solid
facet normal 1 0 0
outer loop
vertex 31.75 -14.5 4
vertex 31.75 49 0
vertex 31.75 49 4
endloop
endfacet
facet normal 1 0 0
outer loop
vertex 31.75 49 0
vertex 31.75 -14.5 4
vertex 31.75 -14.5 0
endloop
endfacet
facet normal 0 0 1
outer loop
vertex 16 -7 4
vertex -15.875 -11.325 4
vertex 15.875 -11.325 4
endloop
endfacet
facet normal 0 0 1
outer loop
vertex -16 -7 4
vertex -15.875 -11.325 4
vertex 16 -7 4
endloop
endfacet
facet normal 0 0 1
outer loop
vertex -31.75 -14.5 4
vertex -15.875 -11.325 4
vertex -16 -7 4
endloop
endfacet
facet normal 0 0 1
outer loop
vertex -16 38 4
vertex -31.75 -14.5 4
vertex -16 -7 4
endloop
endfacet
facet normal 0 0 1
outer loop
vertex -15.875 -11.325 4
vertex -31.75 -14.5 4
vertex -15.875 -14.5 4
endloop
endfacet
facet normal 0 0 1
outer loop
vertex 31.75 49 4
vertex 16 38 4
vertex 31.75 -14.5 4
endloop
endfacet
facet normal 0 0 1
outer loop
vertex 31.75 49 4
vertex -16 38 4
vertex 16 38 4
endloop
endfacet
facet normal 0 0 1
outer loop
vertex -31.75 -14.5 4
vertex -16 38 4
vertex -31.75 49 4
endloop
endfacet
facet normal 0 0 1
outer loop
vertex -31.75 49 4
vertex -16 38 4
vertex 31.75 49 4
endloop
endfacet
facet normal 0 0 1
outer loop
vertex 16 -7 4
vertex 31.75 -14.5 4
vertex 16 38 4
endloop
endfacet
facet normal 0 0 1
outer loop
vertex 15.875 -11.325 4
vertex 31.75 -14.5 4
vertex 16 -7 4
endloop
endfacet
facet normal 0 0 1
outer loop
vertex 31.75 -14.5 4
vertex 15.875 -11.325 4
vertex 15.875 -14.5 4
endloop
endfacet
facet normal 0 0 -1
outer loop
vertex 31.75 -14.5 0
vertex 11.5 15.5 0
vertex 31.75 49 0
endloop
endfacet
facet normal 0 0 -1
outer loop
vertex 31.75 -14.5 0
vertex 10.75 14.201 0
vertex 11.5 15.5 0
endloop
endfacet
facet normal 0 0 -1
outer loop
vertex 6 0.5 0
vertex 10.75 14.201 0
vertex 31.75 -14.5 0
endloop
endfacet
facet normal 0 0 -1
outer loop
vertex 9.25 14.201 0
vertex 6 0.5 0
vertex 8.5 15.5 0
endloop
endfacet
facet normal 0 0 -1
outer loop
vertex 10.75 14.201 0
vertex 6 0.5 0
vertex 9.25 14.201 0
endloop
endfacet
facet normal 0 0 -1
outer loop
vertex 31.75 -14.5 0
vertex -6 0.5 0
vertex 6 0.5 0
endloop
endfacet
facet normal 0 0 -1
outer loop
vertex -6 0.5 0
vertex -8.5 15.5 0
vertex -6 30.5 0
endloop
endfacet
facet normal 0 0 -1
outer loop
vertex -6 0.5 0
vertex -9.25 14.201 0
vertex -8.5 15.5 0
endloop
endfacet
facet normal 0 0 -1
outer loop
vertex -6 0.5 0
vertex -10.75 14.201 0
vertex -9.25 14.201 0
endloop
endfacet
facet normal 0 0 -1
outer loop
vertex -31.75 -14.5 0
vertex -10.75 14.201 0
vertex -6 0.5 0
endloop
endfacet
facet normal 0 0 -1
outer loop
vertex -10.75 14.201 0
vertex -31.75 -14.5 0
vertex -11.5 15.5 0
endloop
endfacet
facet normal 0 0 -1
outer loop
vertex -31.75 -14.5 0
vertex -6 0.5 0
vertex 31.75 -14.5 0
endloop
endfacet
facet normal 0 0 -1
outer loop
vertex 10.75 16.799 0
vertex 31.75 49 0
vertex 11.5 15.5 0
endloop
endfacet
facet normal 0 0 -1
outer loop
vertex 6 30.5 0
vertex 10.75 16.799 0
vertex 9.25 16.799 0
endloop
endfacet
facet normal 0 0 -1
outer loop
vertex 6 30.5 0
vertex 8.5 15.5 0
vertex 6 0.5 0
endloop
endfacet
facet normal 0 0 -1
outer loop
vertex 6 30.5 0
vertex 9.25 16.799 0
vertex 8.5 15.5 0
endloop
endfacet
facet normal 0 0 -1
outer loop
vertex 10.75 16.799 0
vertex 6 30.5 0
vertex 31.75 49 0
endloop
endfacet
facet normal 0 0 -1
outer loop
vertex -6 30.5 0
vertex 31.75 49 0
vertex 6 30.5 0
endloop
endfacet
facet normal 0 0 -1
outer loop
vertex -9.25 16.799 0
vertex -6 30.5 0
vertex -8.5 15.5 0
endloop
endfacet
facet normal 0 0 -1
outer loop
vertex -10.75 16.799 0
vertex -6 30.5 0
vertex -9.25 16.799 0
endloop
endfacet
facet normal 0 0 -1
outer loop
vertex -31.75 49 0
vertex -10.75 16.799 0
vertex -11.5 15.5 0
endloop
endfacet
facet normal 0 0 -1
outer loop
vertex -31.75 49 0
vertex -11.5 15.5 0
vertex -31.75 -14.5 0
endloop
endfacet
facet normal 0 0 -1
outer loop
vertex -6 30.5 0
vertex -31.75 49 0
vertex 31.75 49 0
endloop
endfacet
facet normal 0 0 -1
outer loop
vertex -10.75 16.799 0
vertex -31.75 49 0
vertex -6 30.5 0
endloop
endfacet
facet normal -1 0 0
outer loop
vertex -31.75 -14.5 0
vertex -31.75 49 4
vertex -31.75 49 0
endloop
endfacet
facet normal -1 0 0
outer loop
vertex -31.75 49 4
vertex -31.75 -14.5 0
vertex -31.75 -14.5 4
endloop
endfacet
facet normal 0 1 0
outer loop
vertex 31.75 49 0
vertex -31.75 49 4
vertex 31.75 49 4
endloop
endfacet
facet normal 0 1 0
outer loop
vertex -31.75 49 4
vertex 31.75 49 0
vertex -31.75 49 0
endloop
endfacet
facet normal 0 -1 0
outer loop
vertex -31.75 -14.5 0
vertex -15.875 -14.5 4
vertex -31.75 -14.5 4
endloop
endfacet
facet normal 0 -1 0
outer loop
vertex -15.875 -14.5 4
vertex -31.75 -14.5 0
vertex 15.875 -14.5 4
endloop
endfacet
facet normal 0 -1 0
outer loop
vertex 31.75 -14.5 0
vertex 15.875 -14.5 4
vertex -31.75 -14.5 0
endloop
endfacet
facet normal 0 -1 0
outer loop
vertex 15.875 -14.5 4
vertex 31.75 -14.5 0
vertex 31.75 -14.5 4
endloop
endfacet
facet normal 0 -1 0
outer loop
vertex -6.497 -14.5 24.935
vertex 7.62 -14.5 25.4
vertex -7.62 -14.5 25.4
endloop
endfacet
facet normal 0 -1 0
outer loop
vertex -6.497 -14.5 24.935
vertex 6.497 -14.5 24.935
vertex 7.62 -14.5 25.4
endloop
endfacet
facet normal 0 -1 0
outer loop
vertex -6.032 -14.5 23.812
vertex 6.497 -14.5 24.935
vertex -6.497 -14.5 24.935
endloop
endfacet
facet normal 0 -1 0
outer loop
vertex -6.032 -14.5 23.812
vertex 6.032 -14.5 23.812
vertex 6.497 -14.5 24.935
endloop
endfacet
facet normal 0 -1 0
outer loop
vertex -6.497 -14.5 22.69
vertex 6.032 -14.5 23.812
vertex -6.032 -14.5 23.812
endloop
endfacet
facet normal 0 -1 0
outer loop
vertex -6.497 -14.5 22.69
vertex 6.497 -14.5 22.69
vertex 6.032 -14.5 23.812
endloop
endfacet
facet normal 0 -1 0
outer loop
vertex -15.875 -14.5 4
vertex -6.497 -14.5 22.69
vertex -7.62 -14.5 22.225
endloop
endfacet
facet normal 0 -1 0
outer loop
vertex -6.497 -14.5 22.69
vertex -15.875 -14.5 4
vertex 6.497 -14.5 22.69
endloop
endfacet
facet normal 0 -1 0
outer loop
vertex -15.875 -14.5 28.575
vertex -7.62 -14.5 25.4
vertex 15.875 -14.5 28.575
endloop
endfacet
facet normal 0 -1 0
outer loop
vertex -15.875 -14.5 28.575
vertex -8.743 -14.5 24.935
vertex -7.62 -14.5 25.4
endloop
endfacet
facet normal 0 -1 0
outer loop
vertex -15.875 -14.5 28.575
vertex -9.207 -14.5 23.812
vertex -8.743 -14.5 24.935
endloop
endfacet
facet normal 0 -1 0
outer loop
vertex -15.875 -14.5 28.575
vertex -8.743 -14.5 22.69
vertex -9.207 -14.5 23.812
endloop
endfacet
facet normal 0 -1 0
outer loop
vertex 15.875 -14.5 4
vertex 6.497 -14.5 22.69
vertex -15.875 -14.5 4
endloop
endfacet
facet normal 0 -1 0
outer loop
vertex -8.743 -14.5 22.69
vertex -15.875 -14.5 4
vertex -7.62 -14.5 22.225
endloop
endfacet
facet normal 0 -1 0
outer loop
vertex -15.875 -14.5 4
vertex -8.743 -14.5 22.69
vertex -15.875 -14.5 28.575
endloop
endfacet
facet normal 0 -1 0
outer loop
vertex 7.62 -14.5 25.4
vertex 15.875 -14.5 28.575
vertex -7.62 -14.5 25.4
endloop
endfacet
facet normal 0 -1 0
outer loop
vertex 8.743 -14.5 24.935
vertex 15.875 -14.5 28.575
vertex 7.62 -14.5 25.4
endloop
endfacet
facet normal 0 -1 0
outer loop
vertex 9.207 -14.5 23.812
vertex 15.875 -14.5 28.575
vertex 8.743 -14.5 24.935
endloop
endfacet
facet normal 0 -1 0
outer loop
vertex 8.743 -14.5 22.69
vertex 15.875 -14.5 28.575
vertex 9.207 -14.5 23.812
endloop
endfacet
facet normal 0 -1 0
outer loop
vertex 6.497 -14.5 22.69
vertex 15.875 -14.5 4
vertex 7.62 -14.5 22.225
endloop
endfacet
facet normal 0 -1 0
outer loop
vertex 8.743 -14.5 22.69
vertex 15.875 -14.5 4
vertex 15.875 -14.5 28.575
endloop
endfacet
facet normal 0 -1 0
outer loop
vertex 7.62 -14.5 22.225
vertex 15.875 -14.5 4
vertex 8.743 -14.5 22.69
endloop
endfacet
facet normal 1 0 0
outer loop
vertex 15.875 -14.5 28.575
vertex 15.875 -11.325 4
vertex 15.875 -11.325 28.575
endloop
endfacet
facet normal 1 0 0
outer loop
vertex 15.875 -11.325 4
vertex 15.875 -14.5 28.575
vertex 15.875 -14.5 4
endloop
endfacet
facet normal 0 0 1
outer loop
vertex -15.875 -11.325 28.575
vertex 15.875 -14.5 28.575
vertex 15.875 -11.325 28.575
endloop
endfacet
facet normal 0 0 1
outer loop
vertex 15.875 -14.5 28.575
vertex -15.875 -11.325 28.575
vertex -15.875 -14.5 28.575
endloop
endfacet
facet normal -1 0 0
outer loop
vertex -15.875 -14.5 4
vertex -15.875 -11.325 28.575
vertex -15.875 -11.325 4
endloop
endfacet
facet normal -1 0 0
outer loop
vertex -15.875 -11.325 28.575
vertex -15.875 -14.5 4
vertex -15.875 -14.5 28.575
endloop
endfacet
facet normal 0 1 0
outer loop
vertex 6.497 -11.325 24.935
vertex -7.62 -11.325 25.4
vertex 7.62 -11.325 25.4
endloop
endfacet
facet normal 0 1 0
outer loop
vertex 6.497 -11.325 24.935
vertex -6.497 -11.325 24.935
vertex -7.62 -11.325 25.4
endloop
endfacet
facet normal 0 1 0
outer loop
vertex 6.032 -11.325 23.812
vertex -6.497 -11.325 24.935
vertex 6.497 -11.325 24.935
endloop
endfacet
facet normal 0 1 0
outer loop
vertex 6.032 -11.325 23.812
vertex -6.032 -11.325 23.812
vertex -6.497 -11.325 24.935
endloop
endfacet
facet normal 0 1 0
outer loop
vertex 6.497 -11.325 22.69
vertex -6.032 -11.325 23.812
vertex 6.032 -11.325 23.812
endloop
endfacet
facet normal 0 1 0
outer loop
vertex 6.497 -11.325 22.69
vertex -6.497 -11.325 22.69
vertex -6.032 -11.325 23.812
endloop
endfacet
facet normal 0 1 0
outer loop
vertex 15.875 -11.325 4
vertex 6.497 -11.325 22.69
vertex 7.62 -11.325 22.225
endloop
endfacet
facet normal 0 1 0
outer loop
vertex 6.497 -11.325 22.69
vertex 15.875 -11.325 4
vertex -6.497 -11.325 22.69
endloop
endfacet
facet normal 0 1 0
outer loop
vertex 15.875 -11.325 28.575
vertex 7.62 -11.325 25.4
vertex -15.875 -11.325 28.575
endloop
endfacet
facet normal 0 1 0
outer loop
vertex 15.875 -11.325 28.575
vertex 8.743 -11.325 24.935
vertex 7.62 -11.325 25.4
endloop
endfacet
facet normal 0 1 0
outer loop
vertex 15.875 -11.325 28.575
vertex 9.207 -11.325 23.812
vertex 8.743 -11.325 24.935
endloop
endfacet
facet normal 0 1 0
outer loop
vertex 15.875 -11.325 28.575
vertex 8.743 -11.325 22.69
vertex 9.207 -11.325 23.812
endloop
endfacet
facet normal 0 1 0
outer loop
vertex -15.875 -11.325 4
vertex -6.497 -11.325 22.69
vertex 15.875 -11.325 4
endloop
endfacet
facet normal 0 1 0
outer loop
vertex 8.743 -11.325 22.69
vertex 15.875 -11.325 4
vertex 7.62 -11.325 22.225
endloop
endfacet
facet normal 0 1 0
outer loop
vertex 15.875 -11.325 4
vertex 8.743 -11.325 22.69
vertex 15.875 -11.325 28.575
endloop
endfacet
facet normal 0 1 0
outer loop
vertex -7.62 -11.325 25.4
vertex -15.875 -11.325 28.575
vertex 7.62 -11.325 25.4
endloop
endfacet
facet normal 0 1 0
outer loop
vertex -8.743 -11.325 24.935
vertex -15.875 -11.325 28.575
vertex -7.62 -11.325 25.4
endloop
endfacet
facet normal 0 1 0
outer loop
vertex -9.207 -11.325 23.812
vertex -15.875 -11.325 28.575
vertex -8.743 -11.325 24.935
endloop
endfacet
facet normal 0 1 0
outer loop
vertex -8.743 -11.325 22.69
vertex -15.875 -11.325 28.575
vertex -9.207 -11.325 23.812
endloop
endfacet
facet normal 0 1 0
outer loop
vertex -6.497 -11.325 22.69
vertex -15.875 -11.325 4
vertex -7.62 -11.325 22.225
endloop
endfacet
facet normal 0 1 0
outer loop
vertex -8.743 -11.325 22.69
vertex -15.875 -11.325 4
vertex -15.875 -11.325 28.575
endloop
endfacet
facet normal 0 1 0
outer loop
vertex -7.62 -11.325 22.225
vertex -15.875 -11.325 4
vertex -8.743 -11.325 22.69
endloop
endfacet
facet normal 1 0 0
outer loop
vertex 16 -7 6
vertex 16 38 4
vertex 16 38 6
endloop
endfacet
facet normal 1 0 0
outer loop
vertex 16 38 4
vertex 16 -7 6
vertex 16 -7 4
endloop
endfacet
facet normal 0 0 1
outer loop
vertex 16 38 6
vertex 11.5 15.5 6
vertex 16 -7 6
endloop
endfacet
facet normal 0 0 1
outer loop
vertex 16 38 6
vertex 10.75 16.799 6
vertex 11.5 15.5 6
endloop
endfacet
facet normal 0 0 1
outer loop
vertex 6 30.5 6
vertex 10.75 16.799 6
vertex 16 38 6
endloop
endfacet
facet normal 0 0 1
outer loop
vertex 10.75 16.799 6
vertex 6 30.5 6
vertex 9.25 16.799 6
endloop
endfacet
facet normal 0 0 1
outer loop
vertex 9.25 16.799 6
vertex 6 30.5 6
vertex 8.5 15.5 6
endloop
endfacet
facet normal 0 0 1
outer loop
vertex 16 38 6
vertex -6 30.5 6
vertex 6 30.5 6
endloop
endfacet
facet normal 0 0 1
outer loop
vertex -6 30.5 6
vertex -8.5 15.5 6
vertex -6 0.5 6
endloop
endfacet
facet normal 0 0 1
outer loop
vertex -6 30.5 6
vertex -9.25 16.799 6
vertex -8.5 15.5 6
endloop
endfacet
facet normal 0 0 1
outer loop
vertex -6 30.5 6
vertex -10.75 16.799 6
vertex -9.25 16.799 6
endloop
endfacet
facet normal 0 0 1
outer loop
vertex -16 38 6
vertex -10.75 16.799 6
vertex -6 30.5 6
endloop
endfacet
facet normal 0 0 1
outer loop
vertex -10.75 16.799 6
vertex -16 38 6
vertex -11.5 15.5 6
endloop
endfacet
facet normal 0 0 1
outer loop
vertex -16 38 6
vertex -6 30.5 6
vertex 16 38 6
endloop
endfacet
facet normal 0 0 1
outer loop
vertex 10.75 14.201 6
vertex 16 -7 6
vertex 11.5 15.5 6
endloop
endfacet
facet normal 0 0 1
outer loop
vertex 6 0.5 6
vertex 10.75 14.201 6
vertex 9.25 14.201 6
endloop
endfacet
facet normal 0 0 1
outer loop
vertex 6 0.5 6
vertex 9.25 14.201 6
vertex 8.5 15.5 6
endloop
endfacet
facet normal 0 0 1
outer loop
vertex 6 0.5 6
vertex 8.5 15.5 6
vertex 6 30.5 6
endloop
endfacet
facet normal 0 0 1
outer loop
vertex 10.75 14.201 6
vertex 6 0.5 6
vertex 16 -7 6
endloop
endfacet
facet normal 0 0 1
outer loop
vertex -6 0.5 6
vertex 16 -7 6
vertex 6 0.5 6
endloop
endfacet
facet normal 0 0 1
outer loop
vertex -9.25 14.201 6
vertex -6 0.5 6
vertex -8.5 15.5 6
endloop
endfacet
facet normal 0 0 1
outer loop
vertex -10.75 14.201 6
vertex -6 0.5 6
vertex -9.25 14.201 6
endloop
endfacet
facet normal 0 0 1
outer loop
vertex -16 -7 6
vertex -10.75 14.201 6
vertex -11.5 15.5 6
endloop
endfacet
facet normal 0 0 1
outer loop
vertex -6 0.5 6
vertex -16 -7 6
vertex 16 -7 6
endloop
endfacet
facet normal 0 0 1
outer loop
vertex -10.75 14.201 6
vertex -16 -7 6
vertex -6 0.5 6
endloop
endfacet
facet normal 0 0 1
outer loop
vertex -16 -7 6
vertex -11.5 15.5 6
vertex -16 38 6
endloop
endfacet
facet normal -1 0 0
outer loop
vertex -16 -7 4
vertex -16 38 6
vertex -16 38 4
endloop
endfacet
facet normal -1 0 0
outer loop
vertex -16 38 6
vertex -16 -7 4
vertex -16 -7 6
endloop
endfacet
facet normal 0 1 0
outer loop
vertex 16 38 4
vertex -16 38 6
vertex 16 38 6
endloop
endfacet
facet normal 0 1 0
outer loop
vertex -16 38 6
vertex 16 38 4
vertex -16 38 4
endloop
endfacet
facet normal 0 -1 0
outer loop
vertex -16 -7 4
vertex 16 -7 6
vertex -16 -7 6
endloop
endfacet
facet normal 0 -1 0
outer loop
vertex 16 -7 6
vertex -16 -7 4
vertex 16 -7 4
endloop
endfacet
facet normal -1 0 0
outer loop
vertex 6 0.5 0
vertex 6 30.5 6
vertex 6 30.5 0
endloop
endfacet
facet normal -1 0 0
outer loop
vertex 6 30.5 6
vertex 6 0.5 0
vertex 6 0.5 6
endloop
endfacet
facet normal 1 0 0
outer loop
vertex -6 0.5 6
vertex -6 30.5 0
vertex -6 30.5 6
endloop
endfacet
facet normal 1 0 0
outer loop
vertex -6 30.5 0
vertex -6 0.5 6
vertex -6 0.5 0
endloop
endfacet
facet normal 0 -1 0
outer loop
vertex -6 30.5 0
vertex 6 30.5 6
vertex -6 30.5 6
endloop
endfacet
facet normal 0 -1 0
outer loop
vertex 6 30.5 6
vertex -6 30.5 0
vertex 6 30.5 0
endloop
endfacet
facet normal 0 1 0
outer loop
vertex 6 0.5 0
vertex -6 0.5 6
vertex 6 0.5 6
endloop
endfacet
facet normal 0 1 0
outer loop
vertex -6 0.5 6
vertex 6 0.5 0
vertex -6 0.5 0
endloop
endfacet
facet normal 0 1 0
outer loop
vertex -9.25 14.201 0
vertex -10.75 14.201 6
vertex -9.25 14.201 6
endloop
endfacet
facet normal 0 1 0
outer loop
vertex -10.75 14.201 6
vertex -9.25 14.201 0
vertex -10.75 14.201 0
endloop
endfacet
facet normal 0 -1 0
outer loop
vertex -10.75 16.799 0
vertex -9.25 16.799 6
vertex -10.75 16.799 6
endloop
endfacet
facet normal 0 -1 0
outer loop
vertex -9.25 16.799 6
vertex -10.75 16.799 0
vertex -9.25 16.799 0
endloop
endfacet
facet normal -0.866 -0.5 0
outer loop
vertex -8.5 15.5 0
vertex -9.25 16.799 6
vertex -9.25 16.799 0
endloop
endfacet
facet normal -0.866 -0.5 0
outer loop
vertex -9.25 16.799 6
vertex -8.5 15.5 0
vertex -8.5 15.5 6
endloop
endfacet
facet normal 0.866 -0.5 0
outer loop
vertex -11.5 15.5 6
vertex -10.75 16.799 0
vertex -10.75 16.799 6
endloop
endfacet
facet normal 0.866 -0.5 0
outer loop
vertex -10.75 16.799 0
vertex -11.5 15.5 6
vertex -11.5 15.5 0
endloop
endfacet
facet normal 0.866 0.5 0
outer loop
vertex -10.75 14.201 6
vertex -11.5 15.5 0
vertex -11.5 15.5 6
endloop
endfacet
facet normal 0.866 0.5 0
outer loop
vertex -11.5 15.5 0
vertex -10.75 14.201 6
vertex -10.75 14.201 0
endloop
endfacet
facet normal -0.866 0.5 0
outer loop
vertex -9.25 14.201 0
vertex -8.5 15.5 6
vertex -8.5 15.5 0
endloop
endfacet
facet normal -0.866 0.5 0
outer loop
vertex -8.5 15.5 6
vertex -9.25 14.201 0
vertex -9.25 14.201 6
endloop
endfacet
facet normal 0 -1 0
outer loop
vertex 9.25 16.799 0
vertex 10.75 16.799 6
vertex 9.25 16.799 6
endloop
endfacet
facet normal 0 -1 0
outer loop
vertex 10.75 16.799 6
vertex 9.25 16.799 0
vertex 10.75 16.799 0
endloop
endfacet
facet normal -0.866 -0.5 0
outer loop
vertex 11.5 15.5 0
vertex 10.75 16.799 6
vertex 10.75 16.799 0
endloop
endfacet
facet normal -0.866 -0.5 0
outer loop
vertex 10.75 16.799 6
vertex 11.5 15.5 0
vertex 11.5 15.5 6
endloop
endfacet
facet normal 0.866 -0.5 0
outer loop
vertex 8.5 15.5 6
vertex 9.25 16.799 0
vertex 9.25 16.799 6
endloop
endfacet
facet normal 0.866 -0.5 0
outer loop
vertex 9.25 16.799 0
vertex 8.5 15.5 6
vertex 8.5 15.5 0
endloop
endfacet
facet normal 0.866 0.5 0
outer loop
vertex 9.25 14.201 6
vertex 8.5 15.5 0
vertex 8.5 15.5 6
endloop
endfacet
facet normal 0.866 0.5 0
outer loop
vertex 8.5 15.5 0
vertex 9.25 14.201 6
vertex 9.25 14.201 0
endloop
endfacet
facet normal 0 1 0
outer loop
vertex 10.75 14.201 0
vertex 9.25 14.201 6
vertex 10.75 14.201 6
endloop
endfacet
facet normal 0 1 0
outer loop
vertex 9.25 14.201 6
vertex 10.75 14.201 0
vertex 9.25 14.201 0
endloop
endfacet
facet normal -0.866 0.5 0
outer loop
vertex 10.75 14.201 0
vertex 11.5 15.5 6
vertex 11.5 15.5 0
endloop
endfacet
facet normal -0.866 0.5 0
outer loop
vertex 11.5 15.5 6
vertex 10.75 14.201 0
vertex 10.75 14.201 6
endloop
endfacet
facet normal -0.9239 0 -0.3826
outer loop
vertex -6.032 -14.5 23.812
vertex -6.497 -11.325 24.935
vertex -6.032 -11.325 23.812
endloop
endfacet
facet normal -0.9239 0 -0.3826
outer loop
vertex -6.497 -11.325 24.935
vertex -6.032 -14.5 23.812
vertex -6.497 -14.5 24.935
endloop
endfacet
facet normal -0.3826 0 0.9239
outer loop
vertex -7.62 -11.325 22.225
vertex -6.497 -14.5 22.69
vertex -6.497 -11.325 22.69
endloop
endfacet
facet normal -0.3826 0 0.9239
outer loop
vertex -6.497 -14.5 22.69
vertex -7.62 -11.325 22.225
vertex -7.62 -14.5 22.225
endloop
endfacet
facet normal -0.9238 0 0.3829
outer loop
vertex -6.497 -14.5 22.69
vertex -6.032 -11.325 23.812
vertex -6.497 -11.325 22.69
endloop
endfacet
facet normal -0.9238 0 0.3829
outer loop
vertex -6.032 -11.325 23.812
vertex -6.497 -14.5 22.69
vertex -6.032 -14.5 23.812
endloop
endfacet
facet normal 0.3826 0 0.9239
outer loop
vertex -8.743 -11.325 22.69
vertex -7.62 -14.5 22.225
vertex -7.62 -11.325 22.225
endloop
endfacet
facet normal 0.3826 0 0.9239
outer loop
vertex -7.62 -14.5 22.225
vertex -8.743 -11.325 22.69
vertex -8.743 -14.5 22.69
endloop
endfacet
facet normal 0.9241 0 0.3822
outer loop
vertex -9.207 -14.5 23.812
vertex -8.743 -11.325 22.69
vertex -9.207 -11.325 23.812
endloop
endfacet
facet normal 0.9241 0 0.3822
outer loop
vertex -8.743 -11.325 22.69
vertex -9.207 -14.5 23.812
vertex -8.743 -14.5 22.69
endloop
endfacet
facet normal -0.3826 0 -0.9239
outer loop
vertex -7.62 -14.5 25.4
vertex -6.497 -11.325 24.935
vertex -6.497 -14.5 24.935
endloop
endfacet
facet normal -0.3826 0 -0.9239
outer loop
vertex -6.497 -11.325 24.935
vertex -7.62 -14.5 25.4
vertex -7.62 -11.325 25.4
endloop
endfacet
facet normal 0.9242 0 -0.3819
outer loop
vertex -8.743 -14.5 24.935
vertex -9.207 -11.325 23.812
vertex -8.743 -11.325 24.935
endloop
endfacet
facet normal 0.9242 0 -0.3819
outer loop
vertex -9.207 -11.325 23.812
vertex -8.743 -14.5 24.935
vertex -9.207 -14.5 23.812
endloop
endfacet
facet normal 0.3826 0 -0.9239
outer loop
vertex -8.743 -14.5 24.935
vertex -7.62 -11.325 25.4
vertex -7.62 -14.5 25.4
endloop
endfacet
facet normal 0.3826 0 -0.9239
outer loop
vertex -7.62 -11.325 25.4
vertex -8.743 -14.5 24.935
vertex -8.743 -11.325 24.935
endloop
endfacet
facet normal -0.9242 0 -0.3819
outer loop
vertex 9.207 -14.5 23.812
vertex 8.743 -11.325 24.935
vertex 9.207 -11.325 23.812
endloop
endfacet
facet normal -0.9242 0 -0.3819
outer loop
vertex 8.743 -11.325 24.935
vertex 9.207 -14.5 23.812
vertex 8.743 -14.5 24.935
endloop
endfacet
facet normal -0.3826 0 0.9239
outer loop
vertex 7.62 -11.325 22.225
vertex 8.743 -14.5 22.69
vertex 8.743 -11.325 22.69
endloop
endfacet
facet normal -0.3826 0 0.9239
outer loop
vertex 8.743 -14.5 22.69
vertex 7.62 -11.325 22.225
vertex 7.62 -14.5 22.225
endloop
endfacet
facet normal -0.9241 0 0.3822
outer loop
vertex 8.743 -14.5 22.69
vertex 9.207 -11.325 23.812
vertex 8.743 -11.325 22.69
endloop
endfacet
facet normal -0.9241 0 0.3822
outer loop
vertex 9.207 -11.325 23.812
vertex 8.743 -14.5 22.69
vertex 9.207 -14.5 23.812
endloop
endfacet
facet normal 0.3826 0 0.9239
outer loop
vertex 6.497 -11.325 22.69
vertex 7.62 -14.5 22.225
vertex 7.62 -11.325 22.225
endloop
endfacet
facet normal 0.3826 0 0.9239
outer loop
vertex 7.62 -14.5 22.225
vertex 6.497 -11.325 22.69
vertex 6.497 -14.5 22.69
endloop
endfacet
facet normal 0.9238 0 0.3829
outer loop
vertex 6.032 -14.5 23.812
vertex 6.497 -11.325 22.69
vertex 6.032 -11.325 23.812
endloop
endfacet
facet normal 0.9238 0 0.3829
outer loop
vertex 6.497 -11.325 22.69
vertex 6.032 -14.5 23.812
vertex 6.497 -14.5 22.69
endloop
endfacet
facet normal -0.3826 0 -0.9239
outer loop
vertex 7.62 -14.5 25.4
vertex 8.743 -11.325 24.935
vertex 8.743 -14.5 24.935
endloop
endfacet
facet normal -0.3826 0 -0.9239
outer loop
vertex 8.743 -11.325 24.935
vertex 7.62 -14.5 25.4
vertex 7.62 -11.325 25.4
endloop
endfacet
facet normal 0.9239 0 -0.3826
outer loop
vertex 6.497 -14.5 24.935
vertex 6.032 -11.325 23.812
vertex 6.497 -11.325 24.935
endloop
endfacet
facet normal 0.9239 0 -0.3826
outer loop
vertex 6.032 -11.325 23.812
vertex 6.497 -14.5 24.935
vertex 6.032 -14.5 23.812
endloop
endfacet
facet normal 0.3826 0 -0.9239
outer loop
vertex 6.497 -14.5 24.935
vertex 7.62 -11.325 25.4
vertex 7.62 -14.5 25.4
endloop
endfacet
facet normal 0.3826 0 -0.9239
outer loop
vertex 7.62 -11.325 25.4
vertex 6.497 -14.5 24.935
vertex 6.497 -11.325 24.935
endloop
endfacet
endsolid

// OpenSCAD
// file: utils.scad
//
// general utility functions for OpenSCAD
//
function inch(in) = 25.4*in;
// main file
// mount for 35mm slides and compatible optical components
// Copyright (C) 2016, Theodore C Yapo

use <utils.scad>;


ring_length = 10;
center_height = 14.5;
outer_d = 2*center_height / cos(30);
ring_thickness = 4;
inner_d = outer_d - 2*ring_thickness;
screw_spacing = inch(0.6);
base_width = inch(1.25);
base_thickness = inch(0.125);
base_length = inch(1.125);

face_width = inch(2.5);
face_height = inch(2.5);
nut_block_thickness = 6;
nut_block_width = 12;

// recesses for #4-40 hex nuts
nut_d = inch(0.25) / cos(30) + 0.5;
nut_h = 3;

set_screw_d = inch(0.125);
mounting_hole_spacing = 40;
mounting_hole_height = 15;
mounting_hole_d = 3;
mounting_slot_length = 3;

epsilon = 1;

slide_aperture_height = 30;
slide_aperture_width = 12;
platform_width = 10;
platform_height = 45;
platform_thickness = 2;


face_thickness = 4;

module LED_mount(){
  difference(){
    union(){
      // face
      translate([-face_width/2, -center_height, 0]){
        cube([face_width, face_height, face_thickness]);
      }

      // base
      translate([-base_width/2, -center_height, 0]){
        cube([base_width, base_thickness, base_length]);
      }

      // blade platforms
      translate([-slide_aperture_width/2 - platform_width,
                 +slide_aperture_height/2-center_height -
                 (platform_height-slide_aperture_height)/2,
                 face_thickness]){
        cube([platform_width*2+slide_aperture_width,
              platform_height, platform_thickness]);
      }
    }

    // slide aperture
    translate([-slide_aperture_width/2,
               +slide_aperture_height/2-center_height,
               -epsilon]){
      cube([slide_aperture_width,
            slide_aperture_height,
            face_thickness + platform_thickness + 2*epsilon]);
    }

    // razor mounting holes
    translate([-10,
               +slide_aperture_height/2-center_height -
               (platform_height-slide_aperture_height)/2
               +platform_height/2,
               -epsilon]){
      cylinder($fn=6, d=3, h = face_thickness+platform_thickness+2*epsilon);
    }
    translate([+10,
               +slide_aperture_height/2-center_height -
               (platform_height-slide_aperture_height)/2
               +platform_height/2,
               -epsilon]){
      cylinder($fn=6, d=3, h = face_thickness+platform_thickness+2*epsilon);
    }

    // mounting screw holes
    translate([-inch(0.6)/2,
               -center_height-epsilon,
               (base_length - inch(0.75))/2]){
      rotate([-90, 0, 0]){
        *cylinder($fn=8, d = inch(0.125), h = inch(0.25));
      }
    }
    translate([+inch(0.6)/2,
               -center_height-epsilon,
               (base_length - inch(0.75))/2]){
      rotate([-90, 0, 0]){
        *cylinder($fn=8, d = inch(0.125), h = inch(0.25));
      }
    }
    translate([-inch(0.6)/2,
               -center_height - epsilon,
               base_length - (base_length - inch(0.75))/2]){
      rotate([-90, 0, 0]){
        cylinder($fn=8, d = inch(0.125), h = inch(0.25));
      }
    }
    translate([+inch(0.6)/2,
               -center_height - epsilon,
               base_length - (base_length - inch(0.75))/2]){
      rotate([-90, 0, 0]){
        cylinder($fn=8, d = inch(0.125), h = inch(0.25));
      }
    }
  }  
}

module HS()
{
  translate([-19/2, -14/2, 1.6]){
    cube([19, 14, 5]);
  }
}
module Saber_Z1()
{
  translate([-9.9/2, -9.9/2, 0]){
    cube([34.8, 9.9, 1.6]);
  }
}

module printing_layout()
{
  // rotate([0, 90, 0]){
    LED_mount();
    // }
}

module LED_mount_assembly()
{
  LED_mount();

  translate([0, 0, face_thickness]){
    Saber_Z1();
    color("red") HS();
  }
}


printing_layout();

//LED_mount_assembly();
